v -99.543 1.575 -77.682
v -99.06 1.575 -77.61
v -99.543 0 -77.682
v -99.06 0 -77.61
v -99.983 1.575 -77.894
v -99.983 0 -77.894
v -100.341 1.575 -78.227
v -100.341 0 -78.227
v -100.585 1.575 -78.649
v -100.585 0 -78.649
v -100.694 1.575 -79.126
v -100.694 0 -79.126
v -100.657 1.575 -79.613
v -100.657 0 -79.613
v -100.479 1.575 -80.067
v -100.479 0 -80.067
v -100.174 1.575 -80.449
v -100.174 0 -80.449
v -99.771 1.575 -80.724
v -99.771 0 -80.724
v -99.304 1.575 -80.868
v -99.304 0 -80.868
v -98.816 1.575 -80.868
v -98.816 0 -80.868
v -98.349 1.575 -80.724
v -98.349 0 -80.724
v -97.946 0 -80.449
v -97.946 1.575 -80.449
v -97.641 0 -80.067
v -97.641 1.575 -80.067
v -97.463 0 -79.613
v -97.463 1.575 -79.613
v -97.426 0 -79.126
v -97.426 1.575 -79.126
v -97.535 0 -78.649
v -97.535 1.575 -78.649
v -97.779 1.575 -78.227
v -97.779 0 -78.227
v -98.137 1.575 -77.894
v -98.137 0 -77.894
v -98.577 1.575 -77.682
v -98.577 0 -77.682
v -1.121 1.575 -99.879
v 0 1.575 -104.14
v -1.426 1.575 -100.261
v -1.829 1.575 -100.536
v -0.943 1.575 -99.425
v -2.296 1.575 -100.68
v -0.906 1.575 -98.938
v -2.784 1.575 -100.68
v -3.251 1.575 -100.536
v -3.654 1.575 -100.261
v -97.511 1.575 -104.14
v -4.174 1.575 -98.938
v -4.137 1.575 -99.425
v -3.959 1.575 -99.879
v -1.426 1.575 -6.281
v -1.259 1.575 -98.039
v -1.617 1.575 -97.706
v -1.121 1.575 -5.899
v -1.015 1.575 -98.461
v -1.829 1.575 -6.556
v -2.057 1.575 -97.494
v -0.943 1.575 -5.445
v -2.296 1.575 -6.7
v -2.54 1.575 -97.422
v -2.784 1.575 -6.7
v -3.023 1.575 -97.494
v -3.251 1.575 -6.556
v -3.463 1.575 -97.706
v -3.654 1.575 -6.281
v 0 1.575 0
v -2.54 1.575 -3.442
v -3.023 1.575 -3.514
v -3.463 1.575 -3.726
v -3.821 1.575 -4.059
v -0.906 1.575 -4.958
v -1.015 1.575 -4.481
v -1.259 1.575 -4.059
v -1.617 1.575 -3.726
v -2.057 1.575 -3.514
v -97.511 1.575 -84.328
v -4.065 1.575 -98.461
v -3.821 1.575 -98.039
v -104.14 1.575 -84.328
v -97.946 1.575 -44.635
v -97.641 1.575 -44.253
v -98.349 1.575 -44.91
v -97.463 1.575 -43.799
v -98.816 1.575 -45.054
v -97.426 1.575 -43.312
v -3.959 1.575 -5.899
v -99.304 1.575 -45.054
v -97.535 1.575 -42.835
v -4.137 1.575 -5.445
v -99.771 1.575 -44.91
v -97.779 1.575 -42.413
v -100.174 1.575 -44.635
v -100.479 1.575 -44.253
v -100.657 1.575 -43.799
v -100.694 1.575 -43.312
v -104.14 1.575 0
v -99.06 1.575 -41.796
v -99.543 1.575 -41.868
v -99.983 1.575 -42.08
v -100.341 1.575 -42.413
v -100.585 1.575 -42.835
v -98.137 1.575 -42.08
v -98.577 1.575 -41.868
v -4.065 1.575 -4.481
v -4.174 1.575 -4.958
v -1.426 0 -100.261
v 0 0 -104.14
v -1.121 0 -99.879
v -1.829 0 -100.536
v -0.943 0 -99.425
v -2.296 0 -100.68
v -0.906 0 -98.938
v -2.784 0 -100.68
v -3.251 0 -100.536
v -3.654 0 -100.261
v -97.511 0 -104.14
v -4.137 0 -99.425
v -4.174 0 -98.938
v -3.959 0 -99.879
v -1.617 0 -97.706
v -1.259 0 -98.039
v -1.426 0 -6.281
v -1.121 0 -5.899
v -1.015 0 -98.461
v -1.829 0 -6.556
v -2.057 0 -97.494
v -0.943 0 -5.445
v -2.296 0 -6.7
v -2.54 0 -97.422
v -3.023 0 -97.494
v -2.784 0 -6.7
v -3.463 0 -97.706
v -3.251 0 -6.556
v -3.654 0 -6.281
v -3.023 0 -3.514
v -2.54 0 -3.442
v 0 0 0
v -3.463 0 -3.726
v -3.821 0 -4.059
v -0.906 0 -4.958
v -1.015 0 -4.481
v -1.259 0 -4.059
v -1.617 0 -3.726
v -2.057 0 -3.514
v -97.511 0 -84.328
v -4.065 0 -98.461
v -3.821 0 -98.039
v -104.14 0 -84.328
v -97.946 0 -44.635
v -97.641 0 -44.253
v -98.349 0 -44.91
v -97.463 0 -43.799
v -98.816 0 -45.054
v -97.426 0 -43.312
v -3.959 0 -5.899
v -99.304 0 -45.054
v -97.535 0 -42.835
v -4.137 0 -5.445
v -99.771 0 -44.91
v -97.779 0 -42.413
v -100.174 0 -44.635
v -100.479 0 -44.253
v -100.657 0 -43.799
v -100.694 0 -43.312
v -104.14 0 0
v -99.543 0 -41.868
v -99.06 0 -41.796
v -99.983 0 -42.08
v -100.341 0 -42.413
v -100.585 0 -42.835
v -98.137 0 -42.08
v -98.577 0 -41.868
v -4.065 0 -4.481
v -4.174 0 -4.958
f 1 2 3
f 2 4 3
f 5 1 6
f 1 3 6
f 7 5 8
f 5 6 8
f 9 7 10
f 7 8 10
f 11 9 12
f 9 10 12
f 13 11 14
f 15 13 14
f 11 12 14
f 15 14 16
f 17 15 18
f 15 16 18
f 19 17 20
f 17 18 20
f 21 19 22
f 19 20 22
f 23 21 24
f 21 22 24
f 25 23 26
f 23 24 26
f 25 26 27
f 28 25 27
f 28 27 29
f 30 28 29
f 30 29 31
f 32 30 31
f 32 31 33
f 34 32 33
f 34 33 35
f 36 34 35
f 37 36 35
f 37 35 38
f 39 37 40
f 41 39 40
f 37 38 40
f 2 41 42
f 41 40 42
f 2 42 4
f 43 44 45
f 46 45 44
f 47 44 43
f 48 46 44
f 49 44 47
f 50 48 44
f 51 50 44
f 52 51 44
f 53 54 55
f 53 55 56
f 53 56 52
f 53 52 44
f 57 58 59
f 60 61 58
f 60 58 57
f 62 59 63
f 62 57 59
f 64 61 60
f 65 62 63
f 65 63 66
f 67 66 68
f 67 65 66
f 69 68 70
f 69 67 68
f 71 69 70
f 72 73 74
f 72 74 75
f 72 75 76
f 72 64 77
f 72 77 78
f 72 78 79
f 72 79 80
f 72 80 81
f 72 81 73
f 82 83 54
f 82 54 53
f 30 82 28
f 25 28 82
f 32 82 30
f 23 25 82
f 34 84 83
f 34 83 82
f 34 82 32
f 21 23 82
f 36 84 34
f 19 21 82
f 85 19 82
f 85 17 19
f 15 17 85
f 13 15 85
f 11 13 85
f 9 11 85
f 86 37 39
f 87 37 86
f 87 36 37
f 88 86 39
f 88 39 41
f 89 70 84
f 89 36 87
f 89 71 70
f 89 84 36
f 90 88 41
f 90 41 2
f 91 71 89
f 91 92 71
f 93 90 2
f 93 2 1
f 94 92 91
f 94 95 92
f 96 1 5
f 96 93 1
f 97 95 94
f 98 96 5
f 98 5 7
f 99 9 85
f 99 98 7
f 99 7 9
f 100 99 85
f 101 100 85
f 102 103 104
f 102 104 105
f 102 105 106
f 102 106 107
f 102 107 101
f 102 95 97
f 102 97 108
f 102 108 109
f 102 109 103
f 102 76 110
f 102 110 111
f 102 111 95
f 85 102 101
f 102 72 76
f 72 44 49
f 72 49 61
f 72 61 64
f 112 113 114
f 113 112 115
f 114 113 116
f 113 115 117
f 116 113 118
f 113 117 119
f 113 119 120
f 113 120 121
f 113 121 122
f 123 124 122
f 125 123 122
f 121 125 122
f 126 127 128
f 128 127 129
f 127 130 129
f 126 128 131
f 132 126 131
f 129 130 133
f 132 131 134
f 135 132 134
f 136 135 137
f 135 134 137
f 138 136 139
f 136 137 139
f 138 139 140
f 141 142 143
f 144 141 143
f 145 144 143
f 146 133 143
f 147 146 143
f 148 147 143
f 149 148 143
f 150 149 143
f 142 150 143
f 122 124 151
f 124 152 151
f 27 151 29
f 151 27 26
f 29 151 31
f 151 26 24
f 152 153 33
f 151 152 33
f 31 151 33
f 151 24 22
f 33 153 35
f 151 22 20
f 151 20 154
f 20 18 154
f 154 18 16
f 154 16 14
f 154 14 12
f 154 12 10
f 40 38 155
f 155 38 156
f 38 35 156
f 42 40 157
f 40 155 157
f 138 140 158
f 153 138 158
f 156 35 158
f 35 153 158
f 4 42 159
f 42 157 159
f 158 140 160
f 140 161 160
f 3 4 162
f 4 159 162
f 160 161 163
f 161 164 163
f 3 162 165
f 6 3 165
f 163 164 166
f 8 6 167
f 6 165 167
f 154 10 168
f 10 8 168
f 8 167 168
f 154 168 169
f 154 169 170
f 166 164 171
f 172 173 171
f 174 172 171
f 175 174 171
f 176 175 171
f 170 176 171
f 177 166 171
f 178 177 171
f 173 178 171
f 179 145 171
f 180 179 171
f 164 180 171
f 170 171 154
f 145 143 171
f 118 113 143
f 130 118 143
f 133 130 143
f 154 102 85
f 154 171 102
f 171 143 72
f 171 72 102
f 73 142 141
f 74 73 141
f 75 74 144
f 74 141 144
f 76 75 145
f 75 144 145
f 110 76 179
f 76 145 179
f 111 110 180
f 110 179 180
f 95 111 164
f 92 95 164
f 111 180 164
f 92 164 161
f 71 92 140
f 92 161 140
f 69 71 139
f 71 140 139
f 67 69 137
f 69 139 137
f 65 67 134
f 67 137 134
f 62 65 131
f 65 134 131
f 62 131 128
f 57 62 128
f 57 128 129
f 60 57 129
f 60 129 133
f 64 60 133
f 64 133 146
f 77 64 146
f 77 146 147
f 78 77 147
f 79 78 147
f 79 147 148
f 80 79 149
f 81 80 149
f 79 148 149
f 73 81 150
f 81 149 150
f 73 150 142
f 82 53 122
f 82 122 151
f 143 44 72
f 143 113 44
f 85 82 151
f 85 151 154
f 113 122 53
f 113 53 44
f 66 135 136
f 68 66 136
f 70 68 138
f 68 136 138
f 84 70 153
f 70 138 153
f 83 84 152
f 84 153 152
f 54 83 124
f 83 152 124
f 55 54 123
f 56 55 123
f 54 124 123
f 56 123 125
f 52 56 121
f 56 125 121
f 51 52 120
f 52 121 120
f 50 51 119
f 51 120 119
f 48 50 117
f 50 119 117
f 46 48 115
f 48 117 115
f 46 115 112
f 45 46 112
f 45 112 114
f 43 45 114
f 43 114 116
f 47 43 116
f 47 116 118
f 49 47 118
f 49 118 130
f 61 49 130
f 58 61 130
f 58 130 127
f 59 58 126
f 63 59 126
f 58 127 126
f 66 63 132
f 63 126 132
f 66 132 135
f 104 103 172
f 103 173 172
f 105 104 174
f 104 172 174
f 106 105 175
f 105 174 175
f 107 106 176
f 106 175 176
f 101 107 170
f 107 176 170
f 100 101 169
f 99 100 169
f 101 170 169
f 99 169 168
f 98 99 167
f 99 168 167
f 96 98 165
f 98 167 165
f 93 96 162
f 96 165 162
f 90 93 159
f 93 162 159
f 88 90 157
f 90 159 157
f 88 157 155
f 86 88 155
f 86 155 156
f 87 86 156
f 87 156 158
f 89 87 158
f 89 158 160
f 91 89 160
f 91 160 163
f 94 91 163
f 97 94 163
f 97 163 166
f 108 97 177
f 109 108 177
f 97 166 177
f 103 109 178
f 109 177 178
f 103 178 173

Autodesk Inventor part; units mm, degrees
ref_plane "YZ Plane" through (0, 0, 0) normal (1, 0, 0) x (0, 1, 0)
ref_plane "XZ Plane" through (0, 0, 0) normal (0, 1, 0) x (-1, 0, 0)
ref_plane "XY Plane" through (0, 0, 0) normal (0, 0, 1) x (1, 0, 0)
sketch "Sketch1" plane through (0, 0, 0) normal (0, 1, 0) x (-1, 0, 0)
  line L0 (0, 0) -> (104.14, 0)
  line L1 (104.14, 0) -> (104.14, -104.14)
  line L2 (104.14, -104.14) -> (0, -104.14)
  line L3 (0, -104.14) -> (0, 0)
  dimension "d0" = 104.14
  dimension "d1" = 104.14
extrude "Extrusion1" add sketch "Sketch1" along normal blind 1.5748
hole "Hole1" at (-2.54, 1.5748, -5.08) direction (0, -1, 0) diameter 3.2766 depth 25.4 clearance for "Flat Head Machine Screw (82)" size "#4" standard "Ansi Unified Screw Threads"
hole "Hole2" at (-2.54, 1.5748, -99.06) direction (0, -1, 0) diameter 3.2766 depth 25.4 clearance for "Flat Head Machine Screw (82)" size "#4" standard "Ansi Unified Screw Threads"
sketch "Sketch3" plane through (0, 1.5748, 0) normal (0, 1, 0) x (1, 0, 0)
  line L0 (0, 104.14) -> (-104.14, 104.14) projected
  line L1 (-104.14, 104.14) -> (-97.5106, 104.14)
  line L2 (-97.5106, 104.14) -> (-97.5106, 84.328)
  line L3 (-97.5106, 84.328) -> (-104.14, 84.328)
  line L4 (-104.14, 84.328) -> (-104.14, 104.14)
  line L5 (-104.14, 0) -> (0, 0) projected
  dimension "d46" = 6.6294
  dimension "d47" = 84.328
extrude "Extrusion3" cut sketch "Sketch3" against normal blind 25.4
hole "Hole5" at (-99.06, 1.5748, -79.248) direction (0, -1, 0) diameter 3.2766 depth 25.4 clearance for "Flat Head Machine Screw (82)" size "#4" standard "Ansi Unified Screw Threads"
hole "Hole6" at (-99.06, 1.5748, -43.434) direction (0, -1, 0) diameter 3.2766 depth 25.4 clearance for "Flat Head Machine Screw (82)" size "#4" standard "Ansi Unified Screw Threads"
properties part number "PCB"
